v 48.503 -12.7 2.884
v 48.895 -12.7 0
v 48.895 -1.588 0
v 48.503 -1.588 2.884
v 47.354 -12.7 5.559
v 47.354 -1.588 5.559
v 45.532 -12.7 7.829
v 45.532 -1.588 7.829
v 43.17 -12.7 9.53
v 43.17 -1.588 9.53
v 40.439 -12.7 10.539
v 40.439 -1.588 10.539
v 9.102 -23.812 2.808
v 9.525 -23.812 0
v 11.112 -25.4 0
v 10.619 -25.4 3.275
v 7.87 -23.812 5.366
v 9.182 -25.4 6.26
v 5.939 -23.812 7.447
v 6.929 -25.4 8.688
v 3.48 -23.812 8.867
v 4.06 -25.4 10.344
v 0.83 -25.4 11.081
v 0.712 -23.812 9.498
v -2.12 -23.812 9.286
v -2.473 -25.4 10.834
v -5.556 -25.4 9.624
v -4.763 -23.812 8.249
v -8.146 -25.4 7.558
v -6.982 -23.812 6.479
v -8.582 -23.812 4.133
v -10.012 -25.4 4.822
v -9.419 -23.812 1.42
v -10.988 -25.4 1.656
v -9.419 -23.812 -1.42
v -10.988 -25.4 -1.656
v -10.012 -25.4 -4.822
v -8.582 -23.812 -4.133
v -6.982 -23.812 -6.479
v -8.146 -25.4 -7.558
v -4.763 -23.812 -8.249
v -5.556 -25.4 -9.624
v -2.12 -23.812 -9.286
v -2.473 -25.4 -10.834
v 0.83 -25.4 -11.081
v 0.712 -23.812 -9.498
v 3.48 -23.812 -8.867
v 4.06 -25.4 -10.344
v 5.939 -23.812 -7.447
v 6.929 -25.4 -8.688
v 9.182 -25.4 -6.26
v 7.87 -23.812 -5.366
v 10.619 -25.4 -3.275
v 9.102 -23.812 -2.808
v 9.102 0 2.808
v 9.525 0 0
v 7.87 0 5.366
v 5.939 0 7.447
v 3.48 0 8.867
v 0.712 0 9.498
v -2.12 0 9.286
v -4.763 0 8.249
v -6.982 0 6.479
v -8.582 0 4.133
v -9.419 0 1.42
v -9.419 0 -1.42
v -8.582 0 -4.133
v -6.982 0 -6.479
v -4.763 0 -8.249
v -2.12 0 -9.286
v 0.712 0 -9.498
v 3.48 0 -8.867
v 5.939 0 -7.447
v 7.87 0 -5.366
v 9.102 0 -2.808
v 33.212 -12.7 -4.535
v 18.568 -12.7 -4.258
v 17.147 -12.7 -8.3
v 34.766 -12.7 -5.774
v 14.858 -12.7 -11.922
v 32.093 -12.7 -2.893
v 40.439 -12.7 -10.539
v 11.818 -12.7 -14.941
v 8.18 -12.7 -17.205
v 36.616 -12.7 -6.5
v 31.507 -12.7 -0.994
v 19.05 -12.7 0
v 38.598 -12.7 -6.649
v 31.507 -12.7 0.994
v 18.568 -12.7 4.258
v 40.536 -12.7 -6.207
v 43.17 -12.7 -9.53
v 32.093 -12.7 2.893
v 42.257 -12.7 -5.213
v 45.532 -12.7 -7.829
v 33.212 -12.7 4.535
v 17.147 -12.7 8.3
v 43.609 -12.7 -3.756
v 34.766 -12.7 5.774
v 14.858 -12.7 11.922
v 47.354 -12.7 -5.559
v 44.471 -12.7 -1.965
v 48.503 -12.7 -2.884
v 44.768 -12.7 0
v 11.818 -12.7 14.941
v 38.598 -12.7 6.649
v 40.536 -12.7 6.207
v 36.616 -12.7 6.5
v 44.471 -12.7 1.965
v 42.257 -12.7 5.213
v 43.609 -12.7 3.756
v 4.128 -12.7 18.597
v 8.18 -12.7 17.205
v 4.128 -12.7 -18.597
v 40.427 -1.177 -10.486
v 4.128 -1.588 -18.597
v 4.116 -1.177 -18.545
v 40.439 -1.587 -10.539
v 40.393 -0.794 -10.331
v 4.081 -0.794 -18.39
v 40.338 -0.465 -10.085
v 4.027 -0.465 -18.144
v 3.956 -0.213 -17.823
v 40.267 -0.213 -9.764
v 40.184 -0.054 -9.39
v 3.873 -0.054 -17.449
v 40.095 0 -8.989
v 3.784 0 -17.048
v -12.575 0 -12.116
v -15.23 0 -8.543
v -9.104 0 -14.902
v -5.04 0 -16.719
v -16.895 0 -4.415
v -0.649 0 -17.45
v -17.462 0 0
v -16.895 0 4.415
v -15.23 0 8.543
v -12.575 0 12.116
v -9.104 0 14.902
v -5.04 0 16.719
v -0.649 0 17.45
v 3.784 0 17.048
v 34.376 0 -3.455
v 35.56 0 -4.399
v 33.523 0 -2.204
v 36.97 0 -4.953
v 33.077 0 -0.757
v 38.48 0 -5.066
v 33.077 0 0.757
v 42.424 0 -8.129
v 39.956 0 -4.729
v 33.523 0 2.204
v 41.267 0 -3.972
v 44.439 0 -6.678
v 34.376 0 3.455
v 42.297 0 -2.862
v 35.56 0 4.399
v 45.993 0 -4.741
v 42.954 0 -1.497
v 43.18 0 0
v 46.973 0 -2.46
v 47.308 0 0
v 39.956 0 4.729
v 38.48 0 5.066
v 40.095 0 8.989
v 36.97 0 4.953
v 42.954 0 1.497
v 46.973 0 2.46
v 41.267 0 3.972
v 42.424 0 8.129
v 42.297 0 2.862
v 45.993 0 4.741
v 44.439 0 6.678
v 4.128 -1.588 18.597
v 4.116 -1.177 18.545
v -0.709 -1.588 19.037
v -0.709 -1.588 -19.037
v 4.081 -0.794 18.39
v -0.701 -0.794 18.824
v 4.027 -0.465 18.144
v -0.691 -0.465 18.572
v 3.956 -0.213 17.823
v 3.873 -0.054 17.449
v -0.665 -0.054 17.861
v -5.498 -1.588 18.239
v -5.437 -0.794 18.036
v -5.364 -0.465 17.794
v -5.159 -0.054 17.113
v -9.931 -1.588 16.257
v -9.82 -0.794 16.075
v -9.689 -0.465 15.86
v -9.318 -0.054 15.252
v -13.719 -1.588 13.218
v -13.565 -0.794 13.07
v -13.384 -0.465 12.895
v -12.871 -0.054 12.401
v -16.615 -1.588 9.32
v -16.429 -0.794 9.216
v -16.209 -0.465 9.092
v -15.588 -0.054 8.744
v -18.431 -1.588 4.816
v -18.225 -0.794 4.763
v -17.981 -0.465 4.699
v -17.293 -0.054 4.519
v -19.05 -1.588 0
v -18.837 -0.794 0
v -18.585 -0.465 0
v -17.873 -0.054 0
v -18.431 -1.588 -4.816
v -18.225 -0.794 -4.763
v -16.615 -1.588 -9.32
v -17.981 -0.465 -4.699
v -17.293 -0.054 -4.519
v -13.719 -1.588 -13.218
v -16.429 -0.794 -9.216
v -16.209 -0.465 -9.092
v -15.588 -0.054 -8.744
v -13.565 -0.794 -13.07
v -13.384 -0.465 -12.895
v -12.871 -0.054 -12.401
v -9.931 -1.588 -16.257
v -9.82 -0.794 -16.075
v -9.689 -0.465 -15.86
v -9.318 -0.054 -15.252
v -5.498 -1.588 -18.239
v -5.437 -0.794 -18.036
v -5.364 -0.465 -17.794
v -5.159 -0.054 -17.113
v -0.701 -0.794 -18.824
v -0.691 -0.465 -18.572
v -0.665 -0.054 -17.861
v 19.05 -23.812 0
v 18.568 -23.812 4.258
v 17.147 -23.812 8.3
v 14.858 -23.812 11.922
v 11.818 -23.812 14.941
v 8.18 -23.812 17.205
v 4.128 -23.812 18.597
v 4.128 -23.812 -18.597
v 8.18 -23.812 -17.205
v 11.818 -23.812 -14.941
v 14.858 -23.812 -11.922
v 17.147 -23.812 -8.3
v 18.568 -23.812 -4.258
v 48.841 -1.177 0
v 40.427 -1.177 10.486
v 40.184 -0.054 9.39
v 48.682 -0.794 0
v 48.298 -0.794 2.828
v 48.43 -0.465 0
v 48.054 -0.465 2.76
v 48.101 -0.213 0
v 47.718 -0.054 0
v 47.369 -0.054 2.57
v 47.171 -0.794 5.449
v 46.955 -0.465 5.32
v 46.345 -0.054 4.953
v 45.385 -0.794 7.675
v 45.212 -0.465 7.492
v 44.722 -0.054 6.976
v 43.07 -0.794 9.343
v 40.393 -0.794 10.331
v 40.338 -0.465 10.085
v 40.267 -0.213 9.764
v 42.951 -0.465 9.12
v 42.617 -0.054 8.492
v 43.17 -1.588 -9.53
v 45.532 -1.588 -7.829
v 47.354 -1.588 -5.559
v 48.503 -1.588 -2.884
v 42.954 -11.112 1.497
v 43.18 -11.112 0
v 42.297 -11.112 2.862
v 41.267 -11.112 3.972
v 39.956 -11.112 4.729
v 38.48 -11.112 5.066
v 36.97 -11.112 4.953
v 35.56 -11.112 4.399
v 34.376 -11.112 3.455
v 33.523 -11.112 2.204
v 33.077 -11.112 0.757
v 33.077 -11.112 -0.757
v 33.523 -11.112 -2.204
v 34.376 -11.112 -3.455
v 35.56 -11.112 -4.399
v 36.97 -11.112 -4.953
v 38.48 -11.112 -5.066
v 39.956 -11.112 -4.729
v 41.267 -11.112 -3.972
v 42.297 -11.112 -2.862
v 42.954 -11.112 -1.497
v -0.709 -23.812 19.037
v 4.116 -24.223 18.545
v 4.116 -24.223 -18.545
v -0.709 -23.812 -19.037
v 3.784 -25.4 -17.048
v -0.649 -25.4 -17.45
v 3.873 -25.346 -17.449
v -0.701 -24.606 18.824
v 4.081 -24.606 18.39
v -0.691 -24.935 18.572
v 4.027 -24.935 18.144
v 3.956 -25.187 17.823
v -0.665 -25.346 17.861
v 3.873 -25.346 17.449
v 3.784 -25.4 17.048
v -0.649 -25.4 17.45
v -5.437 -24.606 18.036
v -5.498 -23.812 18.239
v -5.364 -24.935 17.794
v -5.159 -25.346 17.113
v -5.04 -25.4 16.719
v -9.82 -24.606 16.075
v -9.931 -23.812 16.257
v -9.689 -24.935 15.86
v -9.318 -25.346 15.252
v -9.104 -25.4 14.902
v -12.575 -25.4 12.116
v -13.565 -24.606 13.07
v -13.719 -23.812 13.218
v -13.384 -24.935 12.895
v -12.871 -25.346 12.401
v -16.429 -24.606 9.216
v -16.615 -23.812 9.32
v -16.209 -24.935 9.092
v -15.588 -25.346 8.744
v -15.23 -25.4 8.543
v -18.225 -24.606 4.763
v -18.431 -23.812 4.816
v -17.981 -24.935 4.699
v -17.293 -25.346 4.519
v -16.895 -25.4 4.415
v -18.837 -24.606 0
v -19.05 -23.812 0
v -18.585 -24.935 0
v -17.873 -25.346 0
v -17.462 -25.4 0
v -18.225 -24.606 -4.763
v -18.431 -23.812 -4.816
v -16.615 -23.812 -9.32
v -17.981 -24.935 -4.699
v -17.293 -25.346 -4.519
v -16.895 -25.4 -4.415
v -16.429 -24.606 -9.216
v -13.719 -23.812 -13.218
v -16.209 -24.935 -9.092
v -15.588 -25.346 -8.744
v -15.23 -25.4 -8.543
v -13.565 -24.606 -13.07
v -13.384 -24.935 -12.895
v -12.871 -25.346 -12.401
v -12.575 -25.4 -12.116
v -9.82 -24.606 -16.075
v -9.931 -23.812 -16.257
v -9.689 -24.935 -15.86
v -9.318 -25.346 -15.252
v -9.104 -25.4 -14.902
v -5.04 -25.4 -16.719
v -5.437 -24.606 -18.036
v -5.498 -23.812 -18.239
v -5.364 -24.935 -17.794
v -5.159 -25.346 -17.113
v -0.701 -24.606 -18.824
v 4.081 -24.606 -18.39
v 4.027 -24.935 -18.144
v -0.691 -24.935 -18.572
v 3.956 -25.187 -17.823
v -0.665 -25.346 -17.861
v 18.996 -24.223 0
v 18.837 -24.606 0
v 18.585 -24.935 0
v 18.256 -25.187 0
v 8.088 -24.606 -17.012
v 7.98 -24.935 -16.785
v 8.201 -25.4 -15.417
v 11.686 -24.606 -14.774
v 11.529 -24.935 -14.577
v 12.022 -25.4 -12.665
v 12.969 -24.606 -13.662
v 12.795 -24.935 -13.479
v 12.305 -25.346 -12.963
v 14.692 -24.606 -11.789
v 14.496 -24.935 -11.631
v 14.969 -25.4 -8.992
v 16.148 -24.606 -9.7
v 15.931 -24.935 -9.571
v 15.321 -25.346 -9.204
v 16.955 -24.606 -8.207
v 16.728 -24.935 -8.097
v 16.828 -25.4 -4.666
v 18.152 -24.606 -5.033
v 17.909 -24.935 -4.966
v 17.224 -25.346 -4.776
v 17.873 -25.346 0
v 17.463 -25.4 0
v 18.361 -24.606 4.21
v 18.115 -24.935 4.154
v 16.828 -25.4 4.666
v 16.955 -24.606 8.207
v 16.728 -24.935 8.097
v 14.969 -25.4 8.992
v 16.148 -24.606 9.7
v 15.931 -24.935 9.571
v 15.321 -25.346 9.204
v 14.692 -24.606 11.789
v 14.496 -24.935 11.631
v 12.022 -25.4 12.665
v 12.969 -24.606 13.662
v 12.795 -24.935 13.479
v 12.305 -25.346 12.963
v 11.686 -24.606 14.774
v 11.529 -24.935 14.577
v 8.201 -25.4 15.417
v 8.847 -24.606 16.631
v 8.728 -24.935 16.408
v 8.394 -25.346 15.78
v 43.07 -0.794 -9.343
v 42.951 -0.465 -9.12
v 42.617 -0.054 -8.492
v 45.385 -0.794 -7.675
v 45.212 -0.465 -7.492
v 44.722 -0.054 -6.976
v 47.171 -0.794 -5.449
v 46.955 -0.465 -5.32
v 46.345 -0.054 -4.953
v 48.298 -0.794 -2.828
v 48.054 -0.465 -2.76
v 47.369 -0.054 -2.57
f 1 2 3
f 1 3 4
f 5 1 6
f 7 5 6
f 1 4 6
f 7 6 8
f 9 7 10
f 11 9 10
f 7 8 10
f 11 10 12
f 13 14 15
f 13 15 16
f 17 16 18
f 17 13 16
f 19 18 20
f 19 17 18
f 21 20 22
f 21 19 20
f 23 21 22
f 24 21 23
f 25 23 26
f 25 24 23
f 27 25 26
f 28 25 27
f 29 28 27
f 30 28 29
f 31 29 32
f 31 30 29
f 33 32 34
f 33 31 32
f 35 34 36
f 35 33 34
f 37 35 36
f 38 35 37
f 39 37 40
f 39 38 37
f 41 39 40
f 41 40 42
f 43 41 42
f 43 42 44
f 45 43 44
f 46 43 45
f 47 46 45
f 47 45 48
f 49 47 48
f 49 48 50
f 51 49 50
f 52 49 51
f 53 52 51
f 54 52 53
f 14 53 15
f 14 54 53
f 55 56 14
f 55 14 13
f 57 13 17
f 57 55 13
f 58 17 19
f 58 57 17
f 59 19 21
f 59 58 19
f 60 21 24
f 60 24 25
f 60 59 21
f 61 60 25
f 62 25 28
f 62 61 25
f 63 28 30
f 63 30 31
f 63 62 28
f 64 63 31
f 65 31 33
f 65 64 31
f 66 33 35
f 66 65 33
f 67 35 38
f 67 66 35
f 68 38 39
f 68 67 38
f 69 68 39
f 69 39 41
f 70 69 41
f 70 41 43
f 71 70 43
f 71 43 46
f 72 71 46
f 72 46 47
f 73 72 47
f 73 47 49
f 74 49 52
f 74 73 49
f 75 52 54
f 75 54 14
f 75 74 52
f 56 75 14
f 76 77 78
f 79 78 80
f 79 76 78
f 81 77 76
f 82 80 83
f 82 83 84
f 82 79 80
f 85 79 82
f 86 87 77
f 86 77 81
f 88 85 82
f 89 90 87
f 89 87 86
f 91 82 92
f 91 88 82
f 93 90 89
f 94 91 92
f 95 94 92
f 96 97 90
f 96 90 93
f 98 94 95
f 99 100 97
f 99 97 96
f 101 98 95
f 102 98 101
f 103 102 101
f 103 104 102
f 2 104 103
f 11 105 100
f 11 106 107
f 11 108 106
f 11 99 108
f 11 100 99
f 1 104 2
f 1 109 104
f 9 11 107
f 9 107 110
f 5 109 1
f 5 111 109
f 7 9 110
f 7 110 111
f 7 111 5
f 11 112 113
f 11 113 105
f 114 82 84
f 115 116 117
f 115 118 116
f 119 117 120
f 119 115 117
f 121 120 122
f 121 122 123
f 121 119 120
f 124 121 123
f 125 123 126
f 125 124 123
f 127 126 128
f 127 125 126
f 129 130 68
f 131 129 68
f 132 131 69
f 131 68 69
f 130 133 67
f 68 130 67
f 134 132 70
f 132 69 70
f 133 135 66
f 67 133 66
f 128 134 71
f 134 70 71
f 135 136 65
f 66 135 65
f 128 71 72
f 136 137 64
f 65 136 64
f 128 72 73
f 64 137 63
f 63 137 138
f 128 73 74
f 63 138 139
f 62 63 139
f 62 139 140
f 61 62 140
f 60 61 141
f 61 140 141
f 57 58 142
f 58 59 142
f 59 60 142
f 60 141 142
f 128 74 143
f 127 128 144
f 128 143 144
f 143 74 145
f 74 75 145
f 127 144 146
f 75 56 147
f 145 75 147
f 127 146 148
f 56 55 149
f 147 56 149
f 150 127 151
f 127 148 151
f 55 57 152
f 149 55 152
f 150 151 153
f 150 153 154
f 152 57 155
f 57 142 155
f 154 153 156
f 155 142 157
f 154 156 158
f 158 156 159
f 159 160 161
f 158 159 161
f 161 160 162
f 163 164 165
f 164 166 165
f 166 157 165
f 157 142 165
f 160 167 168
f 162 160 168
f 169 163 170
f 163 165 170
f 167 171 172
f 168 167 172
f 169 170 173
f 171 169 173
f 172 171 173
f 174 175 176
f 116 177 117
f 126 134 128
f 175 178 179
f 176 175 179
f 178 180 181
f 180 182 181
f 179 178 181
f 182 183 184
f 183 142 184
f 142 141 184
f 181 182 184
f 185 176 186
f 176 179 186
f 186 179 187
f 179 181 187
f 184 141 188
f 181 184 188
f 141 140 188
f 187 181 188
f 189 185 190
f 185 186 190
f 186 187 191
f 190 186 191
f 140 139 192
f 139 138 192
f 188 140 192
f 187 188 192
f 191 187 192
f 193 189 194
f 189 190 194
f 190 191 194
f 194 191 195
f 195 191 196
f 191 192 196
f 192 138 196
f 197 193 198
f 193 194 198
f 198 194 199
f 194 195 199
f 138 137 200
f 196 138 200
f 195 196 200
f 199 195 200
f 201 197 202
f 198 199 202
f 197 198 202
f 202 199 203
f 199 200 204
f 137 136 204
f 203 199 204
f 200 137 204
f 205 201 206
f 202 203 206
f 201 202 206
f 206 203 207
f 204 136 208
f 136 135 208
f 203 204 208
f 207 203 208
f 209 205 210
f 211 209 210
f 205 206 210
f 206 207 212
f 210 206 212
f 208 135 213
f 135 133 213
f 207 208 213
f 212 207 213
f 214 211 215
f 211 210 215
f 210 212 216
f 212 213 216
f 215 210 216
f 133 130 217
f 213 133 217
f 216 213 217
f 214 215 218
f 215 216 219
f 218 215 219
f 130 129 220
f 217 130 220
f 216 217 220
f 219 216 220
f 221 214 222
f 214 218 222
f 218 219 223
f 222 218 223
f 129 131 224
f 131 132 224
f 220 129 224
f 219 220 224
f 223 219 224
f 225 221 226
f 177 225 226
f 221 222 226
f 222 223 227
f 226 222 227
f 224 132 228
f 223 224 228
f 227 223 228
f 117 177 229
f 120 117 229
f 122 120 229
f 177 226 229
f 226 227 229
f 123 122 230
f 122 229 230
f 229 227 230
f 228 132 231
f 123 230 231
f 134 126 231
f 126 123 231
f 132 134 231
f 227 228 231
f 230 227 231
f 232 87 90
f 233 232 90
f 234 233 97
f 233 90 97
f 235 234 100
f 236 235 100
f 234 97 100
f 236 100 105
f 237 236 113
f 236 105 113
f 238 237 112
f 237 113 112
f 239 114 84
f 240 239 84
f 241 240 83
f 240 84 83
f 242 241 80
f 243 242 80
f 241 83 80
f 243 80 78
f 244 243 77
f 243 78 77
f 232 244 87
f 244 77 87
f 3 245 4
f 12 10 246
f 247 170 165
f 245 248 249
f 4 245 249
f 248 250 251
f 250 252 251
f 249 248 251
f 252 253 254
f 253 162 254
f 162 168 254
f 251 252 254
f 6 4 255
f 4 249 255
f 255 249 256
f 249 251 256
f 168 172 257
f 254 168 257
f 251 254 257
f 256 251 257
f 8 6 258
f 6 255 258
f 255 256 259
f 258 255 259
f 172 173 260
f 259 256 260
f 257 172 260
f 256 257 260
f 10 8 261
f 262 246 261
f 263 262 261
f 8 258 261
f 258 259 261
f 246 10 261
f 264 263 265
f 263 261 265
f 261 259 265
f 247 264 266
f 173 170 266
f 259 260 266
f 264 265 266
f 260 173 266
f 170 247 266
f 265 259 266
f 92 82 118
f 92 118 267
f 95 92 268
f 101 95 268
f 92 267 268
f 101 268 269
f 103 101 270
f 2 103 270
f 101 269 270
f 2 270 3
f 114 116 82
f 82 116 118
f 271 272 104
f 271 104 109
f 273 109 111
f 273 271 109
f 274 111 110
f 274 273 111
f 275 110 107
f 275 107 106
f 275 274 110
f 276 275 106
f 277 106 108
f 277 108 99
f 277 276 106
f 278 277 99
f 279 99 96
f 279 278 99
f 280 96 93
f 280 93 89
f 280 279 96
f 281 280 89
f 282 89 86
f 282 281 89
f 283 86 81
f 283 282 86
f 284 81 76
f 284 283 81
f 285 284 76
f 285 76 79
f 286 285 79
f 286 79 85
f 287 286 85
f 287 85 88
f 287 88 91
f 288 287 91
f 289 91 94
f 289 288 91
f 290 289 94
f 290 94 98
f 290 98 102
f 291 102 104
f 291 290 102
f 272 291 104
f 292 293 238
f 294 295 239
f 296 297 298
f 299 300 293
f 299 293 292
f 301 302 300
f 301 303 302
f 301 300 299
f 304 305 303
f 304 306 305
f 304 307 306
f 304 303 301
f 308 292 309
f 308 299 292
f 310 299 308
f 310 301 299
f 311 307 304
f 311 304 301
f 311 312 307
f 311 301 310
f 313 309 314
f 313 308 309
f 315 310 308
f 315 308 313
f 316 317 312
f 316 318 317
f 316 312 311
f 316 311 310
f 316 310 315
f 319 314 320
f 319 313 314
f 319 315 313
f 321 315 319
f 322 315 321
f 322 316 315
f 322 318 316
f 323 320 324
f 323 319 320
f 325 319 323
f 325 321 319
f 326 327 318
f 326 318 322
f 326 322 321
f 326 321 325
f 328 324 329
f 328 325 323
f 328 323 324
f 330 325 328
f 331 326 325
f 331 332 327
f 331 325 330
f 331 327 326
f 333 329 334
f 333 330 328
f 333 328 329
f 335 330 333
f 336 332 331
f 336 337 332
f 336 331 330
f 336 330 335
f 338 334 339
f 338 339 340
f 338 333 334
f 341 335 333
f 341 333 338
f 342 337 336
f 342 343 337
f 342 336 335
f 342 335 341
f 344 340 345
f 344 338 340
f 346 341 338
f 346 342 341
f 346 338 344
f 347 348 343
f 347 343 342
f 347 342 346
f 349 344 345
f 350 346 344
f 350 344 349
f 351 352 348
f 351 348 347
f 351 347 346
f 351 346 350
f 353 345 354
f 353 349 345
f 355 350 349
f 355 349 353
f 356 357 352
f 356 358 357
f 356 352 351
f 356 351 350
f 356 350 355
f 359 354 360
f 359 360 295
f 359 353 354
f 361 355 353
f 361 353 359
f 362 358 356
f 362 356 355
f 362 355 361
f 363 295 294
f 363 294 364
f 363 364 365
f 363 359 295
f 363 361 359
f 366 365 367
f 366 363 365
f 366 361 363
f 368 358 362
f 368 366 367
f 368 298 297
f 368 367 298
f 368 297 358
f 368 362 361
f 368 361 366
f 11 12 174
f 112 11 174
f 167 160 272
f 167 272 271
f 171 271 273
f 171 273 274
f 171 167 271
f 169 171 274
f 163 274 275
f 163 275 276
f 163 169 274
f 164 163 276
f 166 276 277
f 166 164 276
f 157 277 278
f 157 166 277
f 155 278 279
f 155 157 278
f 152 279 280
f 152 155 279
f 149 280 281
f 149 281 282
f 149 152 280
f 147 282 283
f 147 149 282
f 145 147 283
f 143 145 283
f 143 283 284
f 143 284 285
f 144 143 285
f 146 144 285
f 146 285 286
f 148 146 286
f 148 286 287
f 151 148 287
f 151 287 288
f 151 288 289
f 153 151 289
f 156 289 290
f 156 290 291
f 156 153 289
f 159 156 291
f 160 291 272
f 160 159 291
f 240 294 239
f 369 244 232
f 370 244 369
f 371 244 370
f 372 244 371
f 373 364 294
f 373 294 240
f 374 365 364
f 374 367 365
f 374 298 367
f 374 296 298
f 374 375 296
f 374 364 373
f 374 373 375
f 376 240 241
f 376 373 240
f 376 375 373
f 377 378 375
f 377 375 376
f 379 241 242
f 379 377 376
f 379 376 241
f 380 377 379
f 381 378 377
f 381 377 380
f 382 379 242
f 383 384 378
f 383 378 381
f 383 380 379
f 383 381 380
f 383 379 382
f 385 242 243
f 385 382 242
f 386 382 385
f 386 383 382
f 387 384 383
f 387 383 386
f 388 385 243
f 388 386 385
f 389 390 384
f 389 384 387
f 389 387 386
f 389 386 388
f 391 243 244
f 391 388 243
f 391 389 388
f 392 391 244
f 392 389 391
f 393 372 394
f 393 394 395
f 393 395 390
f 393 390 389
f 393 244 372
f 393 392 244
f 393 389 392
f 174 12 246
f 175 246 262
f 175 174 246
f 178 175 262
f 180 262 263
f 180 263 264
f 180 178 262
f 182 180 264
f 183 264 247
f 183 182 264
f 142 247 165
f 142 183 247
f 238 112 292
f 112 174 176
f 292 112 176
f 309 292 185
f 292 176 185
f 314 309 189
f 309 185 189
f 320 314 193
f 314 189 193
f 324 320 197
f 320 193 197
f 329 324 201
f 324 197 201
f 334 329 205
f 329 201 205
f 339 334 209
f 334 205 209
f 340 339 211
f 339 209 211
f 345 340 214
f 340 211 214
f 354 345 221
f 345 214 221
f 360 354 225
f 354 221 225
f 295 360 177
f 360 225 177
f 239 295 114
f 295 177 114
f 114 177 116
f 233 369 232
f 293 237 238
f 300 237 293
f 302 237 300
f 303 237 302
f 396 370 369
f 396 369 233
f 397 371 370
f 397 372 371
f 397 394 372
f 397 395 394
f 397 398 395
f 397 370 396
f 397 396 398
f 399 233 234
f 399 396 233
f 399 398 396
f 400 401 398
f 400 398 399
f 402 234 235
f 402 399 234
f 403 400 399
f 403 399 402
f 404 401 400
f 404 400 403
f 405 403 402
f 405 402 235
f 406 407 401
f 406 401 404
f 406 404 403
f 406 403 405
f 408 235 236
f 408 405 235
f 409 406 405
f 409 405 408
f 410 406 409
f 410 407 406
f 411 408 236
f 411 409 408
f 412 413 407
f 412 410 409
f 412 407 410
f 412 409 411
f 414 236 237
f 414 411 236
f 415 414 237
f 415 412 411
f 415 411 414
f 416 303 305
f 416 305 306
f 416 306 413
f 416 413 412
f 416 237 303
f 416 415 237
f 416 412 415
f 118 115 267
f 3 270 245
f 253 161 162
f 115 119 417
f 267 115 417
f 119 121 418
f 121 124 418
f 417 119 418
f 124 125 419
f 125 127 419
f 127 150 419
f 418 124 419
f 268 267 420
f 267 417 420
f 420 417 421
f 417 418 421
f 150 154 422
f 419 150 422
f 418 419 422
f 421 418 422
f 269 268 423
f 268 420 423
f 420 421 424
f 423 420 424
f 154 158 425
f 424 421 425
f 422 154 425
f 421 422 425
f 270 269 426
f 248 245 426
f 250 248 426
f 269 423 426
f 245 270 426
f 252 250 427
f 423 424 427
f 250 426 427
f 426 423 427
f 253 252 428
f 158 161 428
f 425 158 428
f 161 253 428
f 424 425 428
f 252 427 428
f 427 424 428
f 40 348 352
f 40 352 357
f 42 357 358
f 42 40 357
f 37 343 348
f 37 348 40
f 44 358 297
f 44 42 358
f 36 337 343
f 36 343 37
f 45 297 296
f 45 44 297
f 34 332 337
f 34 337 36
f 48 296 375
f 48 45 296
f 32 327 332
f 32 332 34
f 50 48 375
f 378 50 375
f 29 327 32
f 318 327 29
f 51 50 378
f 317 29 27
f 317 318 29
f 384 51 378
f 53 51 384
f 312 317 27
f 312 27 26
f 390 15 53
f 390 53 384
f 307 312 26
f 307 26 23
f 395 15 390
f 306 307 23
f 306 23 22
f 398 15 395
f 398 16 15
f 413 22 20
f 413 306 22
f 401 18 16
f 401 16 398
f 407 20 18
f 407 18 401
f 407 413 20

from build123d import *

# Parameters (mm, degrees)
F0_R     = 9.525
F0_R_2   = 5.08
F1_DEPTH = 12.7
F2_DEPTH = 25.4
F3_R     = 1.5875
F4_SIZE  = 1.5875


with BuildPart() as f1:
    # F0 (on Front) → F1 (new body)
    with BuildSketch(Plane.XZ):
        with BuildLine():
            ThreePointArc((4.1275, -18.597479), (14.858186, -11.922114), (19.05, 0))
            ThreePointArc((19.05, 0), (14.858186, 11.922114), (4.1275, 18.597479))
            ThreePointArc((4.1275, 18.597479), (-19.05, 0), (4.1275, -18.597479))
        make_face()
        Circle(F0_R, mode=Mode.SUBTRACT)
        with BuildLine():
            ThreePointArc((4.1275, 18.597479), (14.858186, 11.922114), (19.05, 0))
            ThreePointArc((19.05, 0), (14.858186, -11.922114), (4.1275, -18.597479))
            Line((4.1275, -18.597479), (40.438917, -10.538572))
            ThreePointArc((40.438917, -10.538572), (27.305, 0), (40.438917, 10.538572))
            Line((40.438917, 10.538572), (4.1275, 18.597479))
        make_face()
        with BuildLine():
            ThreePointArc((48.895, 0), (46.519639, 6.755865), (40.438917, 10.538572))
            ThreePointArc((40.438917, 10.538572), (27.305, 0), (40.438917, -10.538572))
            ThreePointArc((40.438917, -10.538572), (46.519639, -6.755865), (48.895, 0))
        make_face()
        with Locations((38.1, 0)):
            Circle(F0_R_2, mode=Mode.SUBTRACT)
    extrude(amount=F1_DEPTH)

    # F0 (on Front) → F2 (join)
    with BuildSketch(Plane.XZ):
        with BuildLine():
            ThreePointArc((4.1275, -18.597479), (14.858186, -11.922114), (19.05, 0))
            ThreePointArc((19.05, 0), (14.858186, 11.922114), (4.1275, 18.597479))
            ThreePointArc((4.1275, 18.597479), (-19.05, 0), (4.1275, -18.597479))
        make_face()
        Circle(F0_R, mode=Mode.SUBTRACT)
    extrude(amount=F2_DEPTH)

    # F3
    f3_edges = [f1.edges().sort_by_distance(p)[0] for p in [
        (-4.1275, -25.4, 18.597479),
        (-19.05, 0, 0),
        (22.283208, 0, 14.568026),
        (48.895, 0, 0),
        (22.283208, 0, -14.568026),
    ]]
    fillet(f3_edges, radius=F3_R)

    # F4
    f4_edges = [f1.edges().sort_by_distance(p)[0] for p in [
        (-9.525, -25.4, 0),
        (33.02, -12.7, 0),
    ]]
    chamfer(f4_edges, length=F4_SIZE)


solid = f1.part
